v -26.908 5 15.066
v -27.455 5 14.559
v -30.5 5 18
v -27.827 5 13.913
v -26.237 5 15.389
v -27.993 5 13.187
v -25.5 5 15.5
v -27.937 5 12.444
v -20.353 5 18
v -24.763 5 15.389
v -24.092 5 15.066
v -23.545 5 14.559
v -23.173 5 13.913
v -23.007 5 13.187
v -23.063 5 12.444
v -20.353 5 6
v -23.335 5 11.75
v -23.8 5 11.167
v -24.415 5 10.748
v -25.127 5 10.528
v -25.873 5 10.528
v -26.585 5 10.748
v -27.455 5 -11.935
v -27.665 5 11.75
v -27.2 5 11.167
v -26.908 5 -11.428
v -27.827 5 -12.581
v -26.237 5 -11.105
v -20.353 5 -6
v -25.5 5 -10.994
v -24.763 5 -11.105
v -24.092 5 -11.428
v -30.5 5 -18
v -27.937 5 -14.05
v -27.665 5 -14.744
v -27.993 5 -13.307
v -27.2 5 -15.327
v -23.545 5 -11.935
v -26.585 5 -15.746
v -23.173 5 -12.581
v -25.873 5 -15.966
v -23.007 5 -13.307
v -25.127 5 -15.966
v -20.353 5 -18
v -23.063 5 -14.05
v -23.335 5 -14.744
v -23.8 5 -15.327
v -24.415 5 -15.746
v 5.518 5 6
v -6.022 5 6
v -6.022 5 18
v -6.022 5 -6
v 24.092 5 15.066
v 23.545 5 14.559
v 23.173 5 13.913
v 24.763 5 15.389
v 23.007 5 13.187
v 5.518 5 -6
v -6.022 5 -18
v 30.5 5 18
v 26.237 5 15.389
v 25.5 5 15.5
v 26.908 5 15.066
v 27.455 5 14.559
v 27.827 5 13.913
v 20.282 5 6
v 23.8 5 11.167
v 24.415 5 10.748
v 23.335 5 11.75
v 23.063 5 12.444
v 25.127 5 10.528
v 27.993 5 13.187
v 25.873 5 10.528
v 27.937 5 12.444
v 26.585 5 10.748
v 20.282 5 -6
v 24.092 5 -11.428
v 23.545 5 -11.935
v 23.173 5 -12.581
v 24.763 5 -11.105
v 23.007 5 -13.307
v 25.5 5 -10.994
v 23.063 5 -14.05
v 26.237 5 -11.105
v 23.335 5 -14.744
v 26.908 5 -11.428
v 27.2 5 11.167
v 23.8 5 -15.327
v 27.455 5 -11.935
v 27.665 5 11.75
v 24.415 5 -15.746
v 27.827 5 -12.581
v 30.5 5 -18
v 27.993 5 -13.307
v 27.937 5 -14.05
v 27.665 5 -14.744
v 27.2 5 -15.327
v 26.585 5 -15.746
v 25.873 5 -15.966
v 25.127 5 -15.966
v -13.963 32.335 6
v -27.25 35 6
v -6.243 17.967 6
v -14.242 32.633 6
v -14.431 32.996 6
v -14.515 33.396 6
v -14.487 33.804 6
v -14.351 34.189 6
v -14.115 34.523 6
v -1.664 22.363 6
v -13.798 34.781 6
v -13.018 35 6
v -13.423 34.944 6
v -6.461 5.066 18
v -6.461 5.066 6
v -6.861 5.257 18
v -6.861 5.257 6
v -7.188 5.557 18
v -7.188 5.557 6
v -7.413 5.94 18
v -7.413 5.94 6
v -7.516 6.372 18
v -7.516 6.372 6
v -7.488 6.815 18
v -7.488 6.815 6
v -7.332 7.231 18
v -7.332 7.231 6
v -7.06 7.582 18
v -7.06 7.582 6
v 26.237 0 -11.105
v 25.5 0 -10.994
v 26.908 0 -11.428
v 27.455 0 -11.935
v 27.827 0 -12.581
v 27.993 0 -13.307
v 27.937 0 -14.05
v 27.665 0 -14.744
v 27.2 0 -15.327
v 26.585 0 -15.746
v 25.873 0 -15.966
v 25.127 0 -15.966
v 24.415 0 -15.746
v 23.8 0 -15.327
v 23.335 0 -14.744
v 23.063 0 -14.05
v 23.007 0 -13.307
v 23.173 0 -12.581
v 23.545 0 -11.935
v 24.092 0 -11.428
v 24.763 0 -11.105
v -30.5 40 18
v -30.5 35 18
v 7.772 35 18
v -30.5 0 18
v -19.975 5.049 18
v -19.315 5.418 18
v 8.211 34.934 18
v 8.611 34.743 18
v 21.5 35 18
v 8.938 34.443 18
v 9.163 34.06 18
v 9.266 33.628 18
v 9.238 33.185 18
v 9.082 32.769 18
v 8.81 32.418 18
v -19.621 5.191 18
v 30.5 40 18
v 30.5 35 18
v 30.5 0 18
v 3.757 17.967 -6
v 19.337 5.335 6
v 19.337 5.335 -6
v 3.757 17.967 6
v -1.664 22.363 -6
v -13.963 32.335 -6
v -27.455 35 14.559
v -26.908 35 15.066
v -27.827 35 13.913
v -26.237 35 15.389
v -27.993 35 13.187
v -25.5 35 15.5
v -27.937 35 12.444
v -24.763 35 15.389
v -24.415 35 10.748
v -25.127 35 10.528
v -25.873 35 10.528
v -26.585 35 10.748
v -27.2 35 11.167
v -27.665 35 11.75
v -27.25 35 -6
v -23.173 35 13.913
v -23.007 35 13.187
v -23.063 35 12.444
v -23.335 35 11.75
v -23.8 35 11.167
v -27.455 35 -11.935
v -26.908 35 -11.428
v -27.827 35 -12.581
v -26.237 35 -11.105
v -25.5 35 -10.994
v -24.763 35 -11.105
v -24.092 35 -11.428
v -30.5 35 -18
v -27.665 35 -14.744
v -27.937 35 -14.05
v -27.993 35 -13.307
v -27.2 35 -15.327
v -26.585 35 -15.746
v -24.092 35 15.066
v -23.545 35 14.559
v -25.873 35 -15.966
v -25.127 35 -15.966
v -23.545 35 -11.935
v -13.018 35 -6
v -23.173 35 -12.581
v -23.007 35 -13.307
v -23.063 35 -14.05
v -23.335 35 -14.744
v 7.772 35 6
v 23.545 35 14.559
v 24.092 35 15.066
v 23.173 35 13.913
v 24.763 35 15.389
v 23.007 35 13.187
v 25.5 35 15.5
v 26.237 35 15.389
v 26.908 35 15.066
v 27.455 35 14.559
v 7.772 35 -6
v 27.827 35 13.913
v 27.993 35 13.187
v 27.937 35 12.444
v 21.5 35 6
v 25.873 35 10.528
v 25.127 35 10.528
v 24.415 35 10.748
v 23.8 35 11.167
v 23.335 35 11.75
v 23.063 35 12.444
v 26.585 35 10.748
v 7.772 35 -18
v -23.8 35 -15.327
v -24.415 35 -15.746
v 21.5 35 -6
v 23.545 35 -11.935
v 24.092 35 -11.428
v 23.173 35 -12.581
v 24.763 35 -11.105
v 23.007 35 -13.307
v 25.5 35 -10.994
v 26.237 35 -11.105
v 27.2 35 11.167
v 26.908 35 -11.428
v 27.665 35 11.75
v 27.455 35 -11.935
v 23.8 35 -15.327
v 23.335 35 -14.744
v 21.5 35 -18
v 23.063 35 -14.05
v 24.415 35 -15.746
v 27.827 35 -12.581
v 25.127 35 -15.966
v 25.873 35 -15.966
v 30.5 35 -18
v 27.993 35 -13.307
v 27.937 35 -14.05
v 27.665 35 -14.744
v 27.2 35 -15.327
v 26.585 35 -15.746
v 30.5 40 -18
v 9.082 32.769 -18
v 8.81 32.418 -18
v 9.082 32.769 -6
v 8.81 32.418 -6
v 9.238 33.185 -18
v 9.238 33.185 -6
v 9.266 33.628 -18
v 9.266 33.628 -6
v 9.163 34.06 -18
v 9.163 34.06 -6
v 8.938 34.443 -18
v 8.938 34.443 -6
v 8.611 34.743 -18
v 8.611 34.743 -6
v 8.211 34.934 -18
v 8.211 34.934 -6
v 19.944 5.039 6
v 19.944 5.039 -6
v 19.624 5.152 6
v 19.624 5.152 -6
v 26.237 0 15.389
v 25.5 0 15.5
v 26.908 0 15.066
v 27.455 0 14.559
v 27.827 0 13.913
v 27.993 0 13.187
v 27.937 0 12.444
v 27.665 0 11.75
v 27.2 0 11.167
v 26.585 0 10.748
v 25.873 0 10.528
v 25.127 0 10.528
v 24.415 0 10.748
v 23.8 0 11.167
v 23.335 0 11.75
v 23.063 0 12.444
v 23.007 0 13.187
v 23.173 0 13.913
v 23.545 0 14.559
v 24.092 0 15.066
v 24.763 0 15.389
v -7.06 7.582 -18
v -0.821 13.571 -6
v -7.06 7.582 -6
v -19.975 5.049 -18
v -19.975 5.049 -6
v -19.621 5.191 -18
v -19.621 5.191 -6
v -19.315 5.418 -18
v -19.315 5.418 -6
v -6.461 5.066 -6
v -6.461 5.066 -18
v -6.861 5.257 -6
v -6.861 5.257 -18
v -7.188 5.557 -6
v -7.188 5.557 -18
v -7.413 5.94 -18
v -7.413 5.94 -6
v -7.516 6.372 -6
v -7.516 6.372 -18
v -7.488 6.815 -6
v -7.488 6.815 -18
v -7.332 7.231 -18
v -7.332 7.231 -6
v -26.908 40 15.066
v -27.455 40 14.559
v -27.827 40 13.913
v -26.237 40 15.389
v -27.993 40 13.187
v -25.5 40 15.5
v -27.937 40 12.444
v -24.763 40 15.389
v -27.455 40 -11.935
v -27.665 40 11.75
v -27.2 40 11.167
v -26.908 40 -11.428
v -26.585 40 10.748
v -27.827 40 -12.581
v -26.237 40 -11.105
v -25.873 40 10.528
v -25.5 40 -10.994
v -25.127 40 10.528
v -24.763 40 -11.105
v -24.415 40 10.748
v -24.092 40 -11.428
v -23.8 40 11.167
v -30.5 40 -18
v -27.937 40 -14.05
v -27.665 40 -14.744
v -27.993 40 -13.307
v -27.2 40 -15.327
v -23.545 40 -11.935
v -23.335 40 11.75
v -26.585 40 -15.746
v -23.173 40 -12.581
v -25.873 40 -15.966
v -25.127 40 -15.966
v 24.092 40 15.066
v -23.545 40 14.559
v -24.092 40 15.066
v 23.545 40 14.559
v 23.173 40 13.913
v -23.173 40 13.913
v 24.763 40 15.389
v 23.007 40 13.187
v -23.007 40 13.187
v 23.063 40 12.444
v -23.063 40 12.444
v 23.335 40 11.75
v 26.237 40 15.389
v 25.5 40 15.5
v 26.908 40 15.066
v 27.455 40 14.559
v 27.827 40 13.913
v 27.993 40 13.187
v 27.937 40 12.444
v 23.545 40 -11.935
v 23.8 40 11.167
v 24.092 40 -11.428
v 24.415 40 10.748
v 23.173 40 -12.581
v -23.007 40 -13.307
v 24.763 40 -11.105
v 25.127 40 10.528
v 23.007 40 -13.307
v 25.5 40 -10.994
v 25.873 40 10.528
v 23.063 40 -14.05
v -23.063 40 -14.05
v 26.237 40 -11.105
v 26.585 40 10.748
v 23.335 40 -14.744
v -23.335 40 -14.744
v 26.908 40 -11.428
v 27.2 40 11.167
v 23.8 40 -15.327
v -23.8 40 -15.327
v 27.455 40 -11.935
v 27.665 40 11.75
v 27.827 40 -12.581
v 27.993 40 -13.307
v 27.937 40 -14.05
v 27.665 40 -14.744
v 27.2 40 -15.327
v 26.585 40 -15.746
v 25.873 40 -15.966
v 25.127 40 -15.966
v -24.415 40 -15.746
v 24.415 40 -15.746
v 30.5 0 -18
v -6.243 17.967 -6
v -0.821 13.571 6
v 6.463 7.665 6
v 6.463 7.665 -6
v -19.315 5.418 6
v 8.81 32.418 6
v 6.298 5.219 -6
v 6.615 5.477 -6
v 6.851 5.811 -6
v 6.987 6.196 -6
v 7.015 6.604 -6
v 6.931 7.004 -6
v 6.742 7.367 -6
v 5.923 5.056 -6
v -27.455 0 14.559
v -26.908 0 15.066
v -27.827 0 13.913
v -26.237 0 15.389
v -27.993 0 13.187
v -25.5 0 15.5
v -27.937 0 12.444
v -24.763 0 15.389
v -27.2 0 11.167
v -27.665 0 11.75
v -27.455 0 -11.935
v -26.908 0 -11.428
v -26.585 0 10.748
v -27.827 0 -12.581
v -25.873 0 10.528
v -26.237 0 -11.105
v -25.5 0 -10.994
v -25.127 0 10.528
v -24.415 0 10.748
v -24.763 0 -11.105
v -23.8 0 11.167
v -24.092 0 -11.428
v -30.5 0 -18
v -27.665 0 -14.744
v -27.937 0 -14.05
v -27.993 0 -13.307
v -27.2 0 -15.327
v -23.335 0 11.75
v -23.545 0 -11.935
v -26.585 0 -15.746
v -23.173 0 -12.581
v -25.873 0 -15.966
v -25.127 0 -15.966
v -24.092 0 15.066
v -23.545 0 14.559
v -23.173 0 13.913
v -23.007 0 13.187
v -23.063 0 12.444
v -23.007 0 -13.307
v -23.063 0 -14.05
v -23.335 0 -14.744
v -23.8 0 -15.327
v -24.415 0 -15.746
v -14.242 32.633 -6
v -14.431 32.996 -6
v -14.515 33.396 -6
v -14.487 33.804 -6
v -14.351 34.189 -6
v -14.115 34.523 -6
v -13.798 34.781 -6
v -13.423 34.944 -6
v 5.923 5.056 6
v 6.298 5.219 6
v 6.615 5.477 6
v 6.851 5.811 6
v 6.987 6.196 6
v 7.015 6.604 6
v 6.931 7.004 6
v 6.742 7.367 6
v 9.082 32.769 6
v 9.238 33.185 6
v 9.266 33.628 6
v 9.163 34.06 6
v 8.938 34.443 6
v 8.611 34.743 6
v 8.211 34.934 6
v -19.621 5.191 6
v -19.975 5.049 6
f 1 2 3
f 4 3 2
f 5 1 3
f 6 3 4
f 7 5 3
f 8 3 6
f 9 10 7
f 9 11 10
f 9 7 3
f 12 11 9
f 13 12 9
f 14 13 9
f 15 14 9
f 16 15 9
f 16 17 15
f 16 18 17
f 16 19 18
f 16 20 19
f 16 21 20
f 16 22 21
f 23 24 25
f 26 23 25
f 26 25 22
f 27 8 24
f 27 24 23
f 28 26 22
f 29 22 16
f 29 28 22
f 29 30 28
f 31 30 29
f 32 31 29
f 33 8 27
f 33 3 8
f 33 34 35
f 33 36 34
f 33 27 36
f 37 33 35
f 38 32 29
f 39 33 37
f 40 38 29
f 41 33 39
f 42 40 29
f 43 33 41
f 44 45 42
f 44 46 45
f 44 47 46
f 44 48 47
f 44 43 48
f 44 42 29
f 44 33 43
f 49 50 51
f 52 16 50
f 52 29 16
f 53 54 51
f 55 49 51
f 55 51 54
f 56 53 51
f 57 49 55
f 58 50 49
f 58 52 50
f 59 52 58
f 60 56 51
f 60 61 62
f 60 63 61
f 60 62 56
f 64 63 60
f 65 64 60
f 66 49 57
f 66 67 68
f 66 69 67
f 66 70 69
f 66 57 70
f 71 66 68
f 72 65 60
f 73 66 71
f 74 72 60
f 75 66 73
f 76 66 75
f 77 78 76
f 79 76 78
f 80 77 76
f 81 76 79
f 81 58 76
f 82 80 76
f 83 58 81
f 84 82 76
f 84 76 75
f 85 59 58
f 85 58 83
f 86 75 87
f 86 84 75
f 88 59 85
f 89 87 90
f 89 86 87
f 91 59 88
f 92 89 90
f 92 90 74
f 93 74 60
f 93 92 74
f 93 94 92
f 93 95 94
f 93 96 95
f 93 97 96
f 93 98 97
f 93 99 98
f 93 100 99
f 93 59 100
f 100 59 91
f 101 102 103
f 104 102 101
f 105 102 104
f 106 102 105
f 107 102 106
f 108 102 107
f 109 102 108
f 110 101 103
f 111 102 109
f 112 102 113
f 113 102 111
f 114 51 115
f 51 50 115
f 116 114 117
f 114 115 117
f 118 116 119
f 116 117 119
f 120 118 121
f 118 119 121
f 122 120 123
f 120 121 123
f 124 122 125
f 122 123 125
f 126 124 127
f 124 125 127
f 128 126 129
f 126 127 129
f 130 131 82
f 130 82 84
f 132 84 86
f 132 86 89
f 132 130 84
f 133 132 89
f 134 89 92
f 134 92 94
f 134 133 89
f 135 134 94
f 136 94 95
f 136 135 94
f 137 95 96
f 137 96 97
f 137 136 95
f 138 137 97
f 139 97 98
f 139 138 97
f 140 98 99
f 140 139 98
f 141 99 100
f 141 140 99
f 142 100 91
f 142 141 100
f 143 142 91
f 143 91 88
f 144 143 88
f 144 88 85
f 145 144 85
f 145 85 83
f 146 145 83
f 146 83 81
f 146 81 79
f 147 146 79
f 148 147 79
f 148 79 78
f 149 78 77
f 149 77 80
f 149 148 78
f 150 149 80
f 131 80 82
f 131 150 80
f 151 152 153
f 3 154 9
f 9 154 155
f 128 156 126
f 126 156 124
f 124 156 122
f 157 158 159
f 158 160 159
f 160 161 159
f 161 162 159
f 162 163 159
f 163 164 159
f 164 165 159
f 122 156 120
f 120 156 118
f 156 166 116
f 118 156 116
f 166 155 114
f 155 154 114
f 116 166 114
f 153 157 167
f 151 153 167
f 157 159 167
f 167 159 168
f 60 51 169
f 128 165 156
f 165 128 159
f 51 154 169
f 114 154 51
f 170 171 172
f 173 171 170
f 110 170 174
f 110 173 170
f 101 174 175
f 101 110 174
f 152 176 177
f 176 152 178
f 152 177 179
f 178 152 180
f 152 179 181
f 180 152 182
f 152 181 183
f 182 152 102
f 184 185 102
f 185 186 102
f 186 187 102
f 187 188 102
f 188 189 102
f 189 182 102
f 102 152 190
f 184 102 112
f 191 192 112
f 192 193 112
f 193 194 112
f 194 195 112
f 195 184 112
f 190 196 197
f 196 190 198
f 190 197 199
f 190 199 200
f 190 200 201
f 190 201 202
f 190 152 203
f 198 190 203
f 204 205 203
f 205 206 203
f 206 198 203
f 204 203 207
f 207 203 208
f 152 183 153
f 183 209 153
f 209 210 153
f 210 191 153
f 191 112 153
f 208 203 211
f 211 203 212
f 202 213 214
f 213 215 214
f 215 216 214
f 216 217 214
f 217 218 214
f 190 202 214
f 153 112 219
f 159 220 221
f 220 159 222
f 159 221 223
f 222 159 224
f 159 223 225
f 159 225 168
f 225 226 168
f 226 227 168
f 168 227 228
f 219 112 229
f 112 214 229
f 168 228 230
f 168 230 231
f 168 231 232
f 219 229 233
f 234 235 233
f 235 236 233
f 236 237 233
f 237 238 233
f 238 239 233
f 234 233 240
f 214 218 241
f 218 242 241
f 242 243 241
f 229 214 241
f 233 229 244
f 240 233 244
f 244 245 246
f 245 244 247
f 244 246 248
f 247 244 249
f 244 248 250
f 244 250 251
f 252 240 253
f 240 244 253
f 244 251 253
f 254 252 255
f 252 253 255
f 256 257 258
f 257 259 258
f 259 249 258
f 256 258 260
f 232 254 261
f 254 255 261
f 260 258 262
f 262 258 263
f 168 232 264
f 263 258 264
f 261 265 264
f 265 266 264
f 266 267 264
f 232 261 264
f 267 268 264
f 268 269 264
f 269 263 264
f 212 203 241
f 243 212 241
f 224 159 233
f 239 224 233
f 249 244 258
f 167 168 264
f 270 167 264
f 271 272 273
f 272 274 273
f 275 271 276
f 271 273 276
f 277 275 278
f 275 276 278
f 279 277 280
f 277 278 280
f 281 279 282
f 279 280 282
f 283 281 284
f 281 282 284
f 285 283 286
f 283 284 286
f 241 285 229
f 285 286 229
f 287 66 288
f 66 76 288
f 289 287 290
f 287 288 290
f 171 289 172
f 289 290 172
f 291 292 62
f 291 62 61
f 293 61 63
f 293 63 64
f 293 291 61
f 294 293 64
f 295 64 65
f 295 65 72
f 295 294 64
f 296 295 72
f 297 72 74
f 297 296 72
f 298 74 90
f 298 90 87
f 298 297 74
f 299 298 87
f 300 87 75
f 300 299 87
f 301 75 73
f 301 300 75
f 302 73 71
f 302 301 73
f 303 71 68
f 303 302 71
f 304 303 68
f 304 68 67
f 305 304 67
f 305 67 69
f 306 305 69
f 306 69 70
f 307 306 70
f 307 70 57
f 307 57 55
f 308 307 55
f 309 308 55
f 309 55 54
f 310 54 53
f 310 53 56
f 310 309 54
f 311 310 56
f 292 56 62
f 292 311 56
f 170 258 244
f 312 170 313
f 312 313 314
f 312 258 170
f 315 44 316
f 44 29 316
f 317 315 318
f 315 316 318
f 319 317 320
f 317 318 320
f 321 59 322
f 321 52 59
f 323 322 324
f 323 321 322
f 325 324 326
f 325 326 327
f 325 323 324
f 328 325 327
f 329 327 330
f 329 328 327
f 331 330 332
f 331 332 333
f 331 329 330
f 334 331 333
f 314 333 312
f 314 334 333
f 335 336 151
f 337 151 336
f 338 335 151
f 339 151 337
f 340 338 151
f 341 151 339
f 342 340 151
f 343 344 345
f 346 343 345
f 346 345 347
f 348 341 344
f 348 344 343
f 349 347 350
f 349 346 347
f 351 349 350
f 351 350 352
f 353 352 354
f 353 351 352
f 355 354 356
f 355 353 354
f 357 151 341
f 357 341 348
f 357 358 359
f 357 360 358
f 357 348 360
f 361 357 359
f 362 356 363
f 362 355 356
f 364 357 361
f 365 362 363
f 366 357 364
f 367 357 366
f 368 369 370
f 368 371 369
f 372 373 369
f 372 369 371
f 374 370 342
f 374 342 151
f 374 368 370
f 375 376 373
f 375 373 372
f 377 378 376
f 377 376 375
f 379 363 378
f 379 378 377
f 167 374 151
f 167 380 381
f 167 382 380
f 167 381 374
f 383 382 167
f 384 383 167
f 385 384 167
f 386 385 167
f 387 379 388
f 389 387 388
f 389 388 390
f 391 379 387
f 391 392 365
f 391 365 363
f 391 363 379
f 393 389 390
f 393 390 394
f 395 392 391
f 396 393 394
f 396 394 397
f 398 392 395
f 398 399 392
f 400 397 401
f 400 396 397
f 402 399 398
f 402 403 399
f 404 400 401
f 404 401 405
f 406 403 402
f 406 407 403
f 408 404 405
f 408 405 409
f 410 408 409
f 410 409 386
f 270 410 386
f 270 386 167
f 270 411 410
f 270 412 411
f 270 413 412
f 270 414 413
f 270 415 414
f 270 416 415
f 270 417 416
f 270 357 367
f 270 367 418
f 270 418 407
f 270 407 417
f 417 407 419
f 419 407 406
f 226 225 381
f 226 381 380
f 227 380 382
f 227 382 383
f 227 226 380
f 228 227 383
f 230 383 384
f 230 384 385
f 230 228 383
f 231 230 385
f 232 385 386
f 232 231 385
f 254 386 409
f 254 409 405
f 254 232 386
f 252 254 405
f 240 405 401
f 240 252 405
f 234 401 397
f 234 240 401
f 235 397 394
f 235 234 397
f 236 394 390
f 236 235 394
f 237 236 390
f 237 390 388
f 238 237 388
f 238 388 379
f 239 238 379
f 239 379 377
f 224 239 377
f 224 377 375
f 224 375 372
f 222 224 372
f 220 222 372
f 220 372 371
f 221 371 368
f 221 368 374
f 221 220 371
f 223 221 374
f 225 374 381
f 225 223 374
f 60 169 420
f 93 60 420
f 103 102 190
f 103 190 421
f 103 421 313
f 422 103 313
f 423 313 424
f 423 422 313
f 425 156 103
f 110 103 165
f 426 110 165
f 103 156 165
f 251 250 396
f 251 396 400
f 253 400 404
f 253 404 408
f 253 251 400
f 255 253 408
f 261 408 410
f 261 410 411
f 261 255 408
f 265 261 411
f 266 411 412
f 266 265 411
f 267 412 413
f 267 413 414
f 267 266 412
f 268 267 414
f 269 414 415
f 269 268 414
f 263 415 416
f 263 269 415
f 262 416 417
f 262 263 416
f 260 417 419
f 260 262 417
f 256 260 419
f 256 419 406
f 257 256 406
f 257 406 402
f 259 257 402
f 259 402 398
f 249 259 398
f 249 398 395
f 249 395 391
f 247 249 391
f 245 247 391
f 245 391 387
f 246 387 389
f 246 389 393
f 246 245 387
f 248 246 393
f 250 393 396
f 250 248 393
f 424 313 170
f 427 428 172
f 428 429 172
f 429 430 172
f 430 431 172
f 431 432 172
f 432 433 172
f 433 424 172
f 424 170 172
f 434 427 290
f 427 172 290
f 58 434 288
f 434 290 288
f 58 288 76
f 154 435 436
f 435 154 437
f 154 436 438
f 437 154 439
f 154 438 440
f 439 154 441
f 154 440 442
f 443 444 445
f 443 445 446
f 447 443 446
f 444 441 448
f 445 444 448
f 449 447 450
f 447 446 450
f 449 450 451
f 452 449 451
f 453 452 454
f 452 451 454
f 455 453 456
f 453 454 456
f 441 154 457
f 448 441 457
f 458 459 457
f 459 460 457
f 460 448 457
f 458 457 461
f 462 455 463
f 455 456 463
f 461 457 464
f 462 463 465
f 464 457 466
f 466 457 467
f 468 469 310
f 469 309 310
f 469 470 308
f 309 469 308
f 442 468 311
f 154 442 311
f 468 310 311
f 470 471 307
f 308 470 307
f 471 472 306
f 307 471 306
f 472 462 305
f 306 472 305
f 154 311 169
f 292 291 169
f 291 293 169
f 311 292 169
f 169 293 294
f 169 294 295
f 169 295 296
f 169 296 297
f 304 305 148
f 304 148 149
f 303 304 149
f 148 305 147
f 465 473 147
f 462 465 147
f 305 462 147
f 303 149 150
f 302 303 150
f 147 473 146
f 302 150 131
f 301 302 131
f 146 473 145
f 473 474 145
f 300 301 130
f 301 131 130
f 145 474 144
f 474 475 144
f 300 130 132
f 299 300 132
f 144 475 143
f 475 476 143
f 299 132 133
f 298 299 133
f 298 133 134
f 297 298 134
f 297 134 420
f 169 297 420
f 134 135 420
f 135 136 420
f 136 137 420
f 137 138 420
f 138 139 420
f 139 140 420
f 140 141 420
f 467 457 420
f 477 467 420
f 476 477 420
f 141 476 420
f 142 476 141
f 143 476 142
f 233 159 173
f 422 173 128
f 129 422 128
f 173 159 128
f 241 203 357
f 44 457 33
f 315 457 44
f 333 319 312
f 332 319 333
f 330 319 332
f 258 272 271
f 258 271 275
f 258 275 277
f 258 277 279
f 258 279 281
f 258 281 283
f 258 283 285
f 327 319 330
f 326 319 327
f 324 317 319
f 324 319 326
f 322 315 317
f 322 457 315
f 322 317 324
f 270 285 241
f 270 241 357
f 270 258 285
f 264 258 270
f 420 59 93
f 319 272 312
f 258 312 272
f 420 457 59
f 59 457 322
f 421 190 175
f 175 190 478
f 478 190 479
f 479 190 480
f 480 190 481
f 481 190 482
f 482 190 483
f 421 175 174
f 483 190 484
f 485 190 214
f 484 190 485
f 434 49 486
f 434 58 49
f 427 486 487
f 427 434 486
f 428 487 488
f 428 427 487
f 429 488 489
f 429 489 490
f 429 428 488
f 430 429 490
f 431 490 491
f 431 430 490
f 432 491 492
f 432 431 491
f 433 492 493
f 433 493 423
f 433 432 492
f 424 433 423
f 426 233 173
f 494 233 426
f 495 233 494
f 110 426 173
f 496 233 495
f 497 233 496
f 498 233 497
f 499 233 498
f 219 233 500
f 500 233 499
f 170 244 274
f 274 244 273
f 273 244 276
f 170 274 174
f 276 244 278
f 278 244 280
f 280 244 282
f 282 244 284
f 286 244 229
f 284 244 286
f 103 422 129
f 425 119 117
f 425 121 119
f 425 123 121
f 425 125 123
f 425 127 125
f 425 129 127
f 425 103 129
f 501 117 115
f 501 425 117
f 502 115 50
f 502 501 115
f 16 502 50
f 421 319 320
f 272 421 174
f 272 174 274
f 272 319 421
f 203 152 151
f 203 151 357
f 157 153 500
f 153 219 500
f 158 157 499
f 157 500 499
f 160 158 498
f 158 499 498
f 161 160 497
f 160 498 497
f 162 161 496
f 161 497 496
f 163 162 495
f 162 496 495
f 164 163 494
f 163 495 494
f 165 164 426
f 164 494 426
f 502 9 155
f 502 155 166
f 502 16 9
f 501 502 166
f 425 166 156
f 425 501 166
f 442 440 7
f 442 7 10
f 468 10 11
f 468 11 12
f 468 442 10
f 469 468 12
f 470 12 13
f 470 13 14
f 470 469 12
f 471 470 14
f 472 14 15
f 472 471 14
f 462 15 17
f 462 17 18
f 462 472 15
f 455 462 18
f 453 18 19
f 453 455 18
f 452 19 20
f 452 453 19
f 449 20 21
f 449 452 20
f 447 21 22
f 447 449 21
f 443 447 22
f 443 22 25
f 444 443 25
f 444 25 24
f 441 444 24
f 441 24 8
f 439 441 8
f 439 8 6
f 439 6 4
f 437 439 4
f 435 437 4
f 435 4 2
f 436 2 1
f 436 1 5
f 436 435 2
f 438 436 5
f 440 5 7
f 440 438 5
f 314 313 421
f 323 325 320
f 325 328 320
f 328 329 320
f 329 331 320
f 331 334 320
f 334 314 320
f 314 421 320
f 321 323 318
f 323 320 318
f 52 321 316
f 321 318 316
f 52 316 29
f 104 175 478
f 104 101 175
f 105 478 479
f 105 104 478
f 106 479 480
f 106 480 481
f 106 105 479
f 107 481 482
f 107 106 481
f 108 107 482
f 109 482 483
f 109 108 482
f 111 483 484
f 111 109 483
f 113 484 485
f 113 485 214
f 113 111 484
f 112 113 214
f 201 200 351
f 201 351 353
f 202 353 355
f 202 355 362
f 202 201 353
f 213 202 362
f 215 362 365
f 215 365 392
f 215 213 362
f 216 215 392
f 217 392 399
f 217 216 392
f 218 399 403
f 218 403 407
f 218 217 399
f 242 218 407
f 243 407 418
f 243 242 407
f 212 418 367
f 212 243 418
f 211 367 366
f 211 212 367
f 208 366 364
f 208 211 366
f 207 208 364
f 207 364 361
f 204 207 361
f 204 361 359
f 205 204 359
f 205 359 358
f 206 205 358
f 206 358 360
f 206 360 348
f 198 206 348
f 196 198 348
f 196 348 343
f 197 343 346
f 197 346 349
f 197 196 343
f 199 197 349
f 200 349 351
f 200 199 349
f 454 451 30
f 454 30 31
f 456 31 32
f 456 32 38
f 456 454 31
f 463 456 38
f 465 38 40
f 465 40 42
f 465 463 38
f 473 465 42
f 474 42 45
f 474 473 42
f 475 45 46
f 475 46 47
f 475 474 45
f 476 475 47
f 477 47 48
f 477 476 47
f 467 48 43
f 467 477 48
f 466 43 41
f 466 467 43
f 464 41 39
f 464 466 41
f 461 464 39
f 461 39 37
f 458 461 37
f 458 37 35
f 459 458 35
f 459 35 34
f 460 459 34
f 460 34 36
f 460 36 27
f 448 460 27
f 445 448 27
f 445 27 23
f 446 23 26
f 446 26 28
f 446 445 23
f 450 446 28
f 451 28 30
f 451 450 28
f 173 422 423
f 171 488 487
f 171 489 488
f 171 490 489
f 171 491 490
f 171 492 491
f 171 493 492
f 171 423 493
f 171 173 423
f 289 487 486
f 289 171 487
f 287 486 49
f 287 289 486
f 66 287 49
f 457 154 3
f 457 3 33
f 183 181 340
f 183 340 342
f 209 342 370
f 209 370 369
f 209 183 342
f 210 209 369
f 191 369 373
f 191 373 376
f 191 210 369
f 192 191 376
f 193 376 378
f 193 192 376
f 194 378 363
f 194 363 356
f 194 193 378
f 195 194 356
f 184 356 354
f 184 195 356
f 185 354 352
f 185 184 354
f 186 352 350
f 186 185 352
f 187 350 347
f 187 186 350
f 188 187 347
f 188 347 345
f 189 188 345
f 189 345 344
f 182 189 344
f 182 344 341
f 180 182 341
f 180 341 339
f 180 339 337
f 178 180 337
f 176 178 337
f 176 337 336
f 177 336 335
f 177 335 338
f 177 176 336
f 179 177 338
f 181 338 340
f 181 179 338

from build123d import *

# Parameters (mm, degrees)
SKETCH1_W           = 61
SKETCH1_H           = 36
SKETCH1_R           = 2.5
BOSS_EXTRUDE1_DEPTH = 5
BOSS_EXTRUDE3_START = -18
BOSS_EXTRUDE3_DEPTH = 6
BOSS_EXTRUDE2_DEPTH = 12
FILLET1_R           = 1.5
FILLET2_R           = 1.5
FILLET3_R           = 1.5
FILLET4_R           = 1.5
SKETCH5_W           = 61
SKETCH5_H           = 36
SKETCH5_R           = 2.5
BOSS_EXTRUDE4_DEPTH = 5
FILLET5_R           = 1.5
FILLET6_R           = 1.5
FILLET7_R           = 1.5


with BuildPart() as part:
    # Sketch1 → Boss-Extrude1 (new body)
    with BuildSketch(Plane(origin=(0, 0, 0), x_dir=(1, 0, 0), z_dir=(0, 1, 0))):
        Rectangle(SKETCH1_W, SKETCH1_H)
        with Locations(Location((-25.5, 13.49396263, 0), (0, 0, 270))):
            Circle(SKETCH1_R, mode=Mode.SUBTRACT)
        with Locations(Location((25.5, 13.49396263, 0), (0, 0, 270))):
            Circle(SKETCH1_R, mode=Mode.SUBTRACT)
        with Locations(Location((25.5, -13, 0), (0, 0, 270))):
            Circle(SKETCH1_R, mode=Mode.SUBTRACT)
        with Locations(Location((-25.5, -13, 0), (0, 0, 270))):
            Circle(SKETCH1_R, mode=Mode.SUBTRACT)
    extrude(amount=BOSS_EXTRUDE1_DEPTH)

    # Sketch4 → Boss-Extrude3 (add, symmetric)
    with BuildSketch(Plane.XY.offset(18).offset(BOSS_EXTRUDE3_START)):
        Polygon((19.75, 5), (-17.25, 35), (-27.25, 35), (9.75, 5), align=None)
    extrude(amount=BOSS_EXTRUDE3_DEPTH, both=True)

    # Sketch3 → Boss-Extrude2 (add)
    with BuildSketch(Plane.XY.offset(18)):
        Polygon((-19.75, 5), (11.5, 35), (21.5, 35), (-9.75, 5), align=None)
    boss_extrude2 = extrude(amount=-BOSS_EXTRUDE2_DEPTH)

    # Mirror1: Boss-Extrude2 across plane
    add(boss_extrude2.mirror(Plane.XY))

    # Fillet1
    fillet1_edges = [part.edges().sort_by_distance(p)[0] for p in [
        (-9.75, 5, 12),
    ]]
    fillet(fillet1_edges, radius=FILLET1_R)

    # Fillet2
    fillet2_edges = [part.edges().sort_by_distance(p)[0] for p in [
        (-9.75, 5, -12),
    ]]
    fillet(fillet2_edges, radius=FILLET2_R)

    # Fillet3
    fillet3_edges = [part.edges().sort_by_distance(p)[0] for p in [
        (9.75, 5, 0),
    ]]
    fillet(fillet3_edges, radius=FILLET3_R)

    # Fillet4
    fillet4_edges = [part.edges().sort_by_distance(p)[0] for p in [
        (19.75, 5, 0),
        (-19.75, 5, 12),
        (-19.75, 5, -12),
    ]]
    fillet(fillet4_edges, radius=FILLET4_R)

    # Sketch5 → Boss-Extrude4 (add)
    with BuildSketch(Plane(origin=(0, 35, 0), x_dir=(1, 0, 0), z_dir=(0, 1, 0))):
        Rectangle(SKETCH5_W, SKETCH5_H)
        with Locations(Location((-25.5, -13, 0), (0, 0, 270))):
            Circle(SKETCH5_R, mode=Mode.SUBTRACT)
        with Locations(Location((-25.5, 13.49396263, 0), (0, 0, 270))):
            Circle(SKETCH5_R, mode=Mode.SUBTRACT)
        with Locations(Location((25.5, 13.49396263, 0), (0, 0, 270))):
            Circle(SKETCH5_R, mode=Mode.SUBTRACT)
        with Locations(Location((25.5, -13, 0), (0, 0, 270))):
            Circle(SKETCH5_R, mode=Mode.SUBTRACT)
    extrude(amount=BOSS_EXTRUDE4_DEPTH)

    # Fillet5
    fillet5_edges = [part.edges().sort_by_distance(p)[0] for p in [
        (11.5, 35, 12),
    ]]
    fillet(fillet5_edges, radius=FILLET5_R)

    # Fillet6
    fillet6_edges = [part.edges().sort_by_distance(p)[0] for p in [
        (11.5, 35, -12),
    ]]
    fillet(fillet6_edges, radius=FILLET6_R)

    # Fillet7
    fillet7_edges = [part.edges().sort_by_distance(p)[0] for p in [
        (-17.25, 35, 0),
    ]]
    fillet(fillet7_edges, radius=FILLET7_R)


solid = part.part
